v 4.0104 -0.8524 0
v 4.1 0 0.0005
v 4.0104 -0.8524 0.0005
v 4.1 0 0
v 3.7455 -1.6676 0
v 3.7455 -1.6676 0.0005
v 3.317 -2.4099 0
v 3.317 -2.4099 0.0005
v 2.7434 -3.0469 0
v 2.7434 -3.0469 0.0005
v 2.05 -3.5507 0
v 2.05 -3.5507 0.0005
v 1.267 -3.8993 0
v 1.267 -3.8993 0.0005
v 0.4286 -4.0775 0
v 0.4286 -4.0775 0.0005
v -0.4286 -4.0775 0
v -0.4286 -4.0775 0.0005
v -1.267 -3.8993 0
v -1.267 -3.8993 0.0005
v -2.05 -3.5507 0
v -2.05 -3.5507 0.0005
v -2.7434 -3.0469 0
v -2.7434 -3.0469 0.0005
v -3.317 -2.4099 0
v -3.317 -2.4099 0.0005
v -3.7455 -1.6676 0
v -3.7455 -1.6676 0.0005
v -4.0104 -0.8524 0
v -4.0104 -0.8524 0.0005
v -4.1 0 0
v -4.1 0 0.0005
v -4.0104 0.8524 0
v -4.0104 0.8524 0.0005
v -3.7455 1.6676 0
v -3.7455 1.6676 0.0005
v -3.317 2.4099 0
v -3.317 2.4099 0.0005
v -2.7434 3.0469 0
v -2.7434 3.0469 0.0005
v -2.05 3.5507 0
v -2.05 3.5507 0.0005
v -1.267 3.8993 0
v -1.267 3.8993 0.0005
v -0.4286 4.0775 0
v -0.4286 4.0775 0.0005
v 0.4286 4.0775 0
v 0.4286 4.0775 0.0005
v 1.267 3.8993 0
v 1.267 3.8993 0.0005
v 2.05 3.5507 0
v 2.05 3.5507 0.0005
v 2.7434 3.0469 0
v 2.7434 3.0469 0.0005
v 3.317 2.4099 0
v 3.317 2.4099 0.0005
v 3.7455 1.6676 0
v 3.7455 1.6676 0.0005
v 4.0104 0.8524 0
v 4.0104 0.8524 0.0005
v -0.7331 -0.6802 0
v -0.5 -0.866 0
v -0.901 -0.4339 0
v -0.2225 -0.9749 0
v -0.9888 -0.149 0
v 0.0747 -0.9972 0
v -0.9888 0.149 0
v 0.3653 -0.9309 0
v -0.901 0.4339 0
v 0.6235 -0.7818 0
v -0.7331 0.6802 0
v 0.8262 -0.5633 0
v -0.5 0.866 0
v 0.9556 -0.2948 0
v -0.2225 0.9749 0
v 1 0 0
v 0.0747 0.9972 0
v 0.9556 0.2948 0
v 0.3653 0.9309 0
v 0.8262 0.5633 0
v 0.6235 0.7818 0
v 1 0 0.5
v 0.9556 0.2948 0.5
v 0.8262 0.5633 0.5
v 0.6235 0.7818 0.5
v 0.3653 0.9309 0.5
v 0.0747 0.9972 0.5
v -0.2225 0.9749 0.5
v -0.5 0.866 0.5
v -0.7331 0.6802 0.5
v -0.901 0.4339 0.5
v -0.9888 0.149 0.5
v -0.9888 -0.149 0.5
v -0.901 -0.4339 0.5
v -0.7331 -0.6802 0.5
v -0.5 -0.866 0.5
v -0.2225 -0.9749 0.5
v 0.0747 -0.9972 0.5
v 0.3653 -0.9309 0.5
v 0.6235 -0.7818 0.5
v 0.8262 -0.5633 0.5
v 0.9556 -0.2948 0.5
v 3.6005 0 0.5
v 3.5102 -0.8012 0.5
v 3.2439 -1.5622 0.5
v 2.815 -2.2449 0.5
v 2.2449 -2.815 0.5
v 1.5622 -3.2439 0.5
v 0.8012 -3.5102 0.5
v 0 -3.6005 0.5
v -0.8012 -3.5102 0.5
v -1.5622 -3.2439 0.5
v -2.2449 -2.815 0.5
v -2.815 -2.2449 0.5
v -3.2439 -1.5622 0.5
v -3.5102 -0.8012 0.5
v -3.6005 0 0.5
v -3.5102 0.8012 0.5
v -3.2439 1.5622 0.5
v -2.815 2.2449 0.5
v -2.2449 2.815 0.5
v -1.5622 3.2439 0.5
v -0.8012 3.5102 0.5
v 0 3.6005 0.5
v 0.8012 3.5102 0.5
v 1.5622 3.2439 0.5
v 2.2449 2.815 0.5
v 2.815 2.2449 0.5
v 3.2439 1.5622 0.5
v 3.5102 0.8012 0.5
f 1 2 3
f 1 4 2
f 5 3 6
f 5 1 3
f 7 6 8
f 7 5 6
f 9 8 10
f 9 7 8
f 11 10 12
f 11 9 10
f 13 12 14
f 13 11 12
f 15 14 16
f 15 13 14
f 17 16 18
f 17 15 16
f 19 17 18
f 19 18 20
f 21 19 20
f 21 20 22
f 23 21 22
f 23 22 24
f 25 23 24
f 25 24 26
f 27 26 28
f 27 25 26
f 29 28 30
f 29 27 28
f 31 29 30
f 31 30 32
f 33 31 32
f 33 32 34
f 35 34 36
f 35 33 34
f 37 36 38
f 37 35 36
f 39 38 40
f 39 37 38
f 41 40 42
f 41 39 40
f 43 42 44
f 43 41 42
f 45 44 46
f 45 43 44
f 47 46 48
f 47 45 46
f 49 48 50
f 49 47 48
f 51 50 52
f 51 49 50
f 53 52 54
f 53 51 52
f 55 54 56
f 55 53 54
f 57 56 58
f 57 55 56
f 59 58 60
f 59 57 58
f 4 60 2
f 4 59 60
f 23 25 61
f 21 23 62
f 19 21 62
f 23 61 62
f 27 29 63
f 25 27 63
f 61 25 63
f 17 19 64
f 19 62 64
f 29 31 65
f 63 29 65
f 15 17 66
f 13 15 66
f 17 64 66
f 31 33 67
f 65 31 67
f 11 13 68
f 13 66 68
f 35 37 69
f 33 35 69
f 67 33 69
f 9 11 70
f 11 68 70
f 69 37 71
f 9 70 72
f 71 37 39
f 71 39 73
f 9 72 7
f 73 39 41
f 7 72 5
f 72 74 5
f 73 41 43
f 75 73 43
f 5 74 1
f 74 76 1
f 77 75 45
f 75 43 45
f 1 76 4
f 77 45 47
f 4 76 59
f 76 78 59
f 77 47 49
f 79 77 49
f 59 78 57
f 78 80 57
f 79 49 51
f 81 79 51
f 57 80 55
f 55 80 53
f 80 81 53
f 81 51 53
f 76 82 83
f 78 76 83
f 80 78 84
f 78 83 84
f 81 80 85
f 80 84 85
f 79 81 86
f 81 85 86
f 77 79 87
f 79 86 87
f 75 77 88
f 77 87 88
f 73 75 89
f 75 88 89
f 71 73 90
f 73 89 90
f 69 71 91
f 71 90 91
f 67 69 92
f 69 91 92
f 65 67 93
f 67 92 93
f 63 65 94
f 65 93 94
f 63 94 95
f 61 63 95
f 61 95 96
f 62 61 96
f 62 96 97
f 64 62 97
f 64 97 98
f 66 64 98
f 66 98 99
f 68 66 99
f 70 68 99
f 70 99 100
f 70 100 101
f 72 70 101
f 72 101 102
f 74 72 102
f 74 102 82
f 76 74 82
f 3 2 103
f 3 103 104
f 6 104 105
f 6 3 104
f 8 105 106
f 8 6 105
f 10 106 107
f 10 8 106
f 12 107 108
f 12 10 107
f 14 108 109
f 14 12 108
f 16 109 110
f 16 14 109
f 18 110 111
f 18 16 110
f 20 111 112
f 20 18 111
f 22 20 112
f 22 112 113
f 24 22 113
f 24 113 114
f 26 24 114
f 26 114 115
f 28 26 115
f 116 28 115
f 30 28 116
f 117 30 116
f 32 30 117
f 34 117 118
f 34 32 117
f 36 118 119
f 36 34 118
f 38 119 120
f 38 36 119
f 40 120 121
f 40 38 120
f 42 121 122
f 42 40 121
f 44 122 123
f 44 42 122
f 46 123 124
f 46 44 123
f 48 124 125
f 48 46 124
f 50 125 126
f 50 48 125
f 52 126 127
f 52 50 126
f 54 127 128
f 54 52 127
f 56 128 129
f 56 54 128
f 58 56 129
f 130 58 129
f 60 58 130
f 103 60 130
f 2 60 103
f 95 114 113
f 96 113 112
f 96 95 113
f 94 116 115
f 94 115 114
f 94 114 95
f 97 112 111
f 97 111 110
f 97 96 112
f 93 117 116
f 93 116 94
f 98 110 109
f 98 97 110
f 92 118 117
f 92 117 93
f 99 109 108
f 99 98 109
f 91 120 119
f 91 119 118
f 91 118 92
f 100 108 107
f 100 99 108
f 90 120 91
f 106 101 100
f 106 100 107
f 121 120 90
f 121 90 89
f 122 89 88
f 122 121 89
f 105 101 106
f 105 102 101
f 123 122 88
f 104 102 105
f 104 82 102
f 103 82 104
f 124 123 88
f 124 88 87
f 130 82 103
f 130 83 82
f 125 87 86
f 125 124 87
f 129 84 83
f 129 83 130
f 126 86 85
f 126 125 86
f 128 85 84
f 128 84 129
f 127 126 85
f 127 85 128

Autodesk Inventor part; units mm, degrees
ref_plane "YZ Plane" through (0, 0, 0) normal (1, 0, 0) x (0, 1, 0)
ref_plane "XZ Plane" through (0, 0, 0) normal (0, 1, 0) x (-1, 0, 0)
ref_plane "XY Plane" through (0, 0, 0) normal (0, 0, 1) x (1, 0, 0)
sketch "スケッチ1" plane through (0, 0, 0) normal (0, 0, 1) x (1, 0, 0)
  circle A0 centre (0, 0) radius 4.1
  dimension "d0" = 8.2
extrude "押し出し1" add sketch "スケッチ1" along normal blind 1
chamfer "面取り1" distance 1 angle 45 1 edges at (-4.1, 0, 1) measured on face at (0.2975, 0.2635, 1)
sketch "スケッチ2" plane through (0, 0, 1) normal (0, 0, 1) x (1, 0, 0)
  circle A0 centre (0, 0) radius 1
  dimension "d6" = 2
extrude "押し出し2" cut sketch "スケッチ2" against normal blind 1
sketch "スケッチ3" plane through (0, 0, 1) normal (0, 0, 1) x (1, 0, 0)
  circle A0 centre (0, 0) radius 4.8361
extrude "押し出し3" cut sketch "スケッチ3" against normal blind 0.5
properties part number "blade" material "ステンレス鋼"
